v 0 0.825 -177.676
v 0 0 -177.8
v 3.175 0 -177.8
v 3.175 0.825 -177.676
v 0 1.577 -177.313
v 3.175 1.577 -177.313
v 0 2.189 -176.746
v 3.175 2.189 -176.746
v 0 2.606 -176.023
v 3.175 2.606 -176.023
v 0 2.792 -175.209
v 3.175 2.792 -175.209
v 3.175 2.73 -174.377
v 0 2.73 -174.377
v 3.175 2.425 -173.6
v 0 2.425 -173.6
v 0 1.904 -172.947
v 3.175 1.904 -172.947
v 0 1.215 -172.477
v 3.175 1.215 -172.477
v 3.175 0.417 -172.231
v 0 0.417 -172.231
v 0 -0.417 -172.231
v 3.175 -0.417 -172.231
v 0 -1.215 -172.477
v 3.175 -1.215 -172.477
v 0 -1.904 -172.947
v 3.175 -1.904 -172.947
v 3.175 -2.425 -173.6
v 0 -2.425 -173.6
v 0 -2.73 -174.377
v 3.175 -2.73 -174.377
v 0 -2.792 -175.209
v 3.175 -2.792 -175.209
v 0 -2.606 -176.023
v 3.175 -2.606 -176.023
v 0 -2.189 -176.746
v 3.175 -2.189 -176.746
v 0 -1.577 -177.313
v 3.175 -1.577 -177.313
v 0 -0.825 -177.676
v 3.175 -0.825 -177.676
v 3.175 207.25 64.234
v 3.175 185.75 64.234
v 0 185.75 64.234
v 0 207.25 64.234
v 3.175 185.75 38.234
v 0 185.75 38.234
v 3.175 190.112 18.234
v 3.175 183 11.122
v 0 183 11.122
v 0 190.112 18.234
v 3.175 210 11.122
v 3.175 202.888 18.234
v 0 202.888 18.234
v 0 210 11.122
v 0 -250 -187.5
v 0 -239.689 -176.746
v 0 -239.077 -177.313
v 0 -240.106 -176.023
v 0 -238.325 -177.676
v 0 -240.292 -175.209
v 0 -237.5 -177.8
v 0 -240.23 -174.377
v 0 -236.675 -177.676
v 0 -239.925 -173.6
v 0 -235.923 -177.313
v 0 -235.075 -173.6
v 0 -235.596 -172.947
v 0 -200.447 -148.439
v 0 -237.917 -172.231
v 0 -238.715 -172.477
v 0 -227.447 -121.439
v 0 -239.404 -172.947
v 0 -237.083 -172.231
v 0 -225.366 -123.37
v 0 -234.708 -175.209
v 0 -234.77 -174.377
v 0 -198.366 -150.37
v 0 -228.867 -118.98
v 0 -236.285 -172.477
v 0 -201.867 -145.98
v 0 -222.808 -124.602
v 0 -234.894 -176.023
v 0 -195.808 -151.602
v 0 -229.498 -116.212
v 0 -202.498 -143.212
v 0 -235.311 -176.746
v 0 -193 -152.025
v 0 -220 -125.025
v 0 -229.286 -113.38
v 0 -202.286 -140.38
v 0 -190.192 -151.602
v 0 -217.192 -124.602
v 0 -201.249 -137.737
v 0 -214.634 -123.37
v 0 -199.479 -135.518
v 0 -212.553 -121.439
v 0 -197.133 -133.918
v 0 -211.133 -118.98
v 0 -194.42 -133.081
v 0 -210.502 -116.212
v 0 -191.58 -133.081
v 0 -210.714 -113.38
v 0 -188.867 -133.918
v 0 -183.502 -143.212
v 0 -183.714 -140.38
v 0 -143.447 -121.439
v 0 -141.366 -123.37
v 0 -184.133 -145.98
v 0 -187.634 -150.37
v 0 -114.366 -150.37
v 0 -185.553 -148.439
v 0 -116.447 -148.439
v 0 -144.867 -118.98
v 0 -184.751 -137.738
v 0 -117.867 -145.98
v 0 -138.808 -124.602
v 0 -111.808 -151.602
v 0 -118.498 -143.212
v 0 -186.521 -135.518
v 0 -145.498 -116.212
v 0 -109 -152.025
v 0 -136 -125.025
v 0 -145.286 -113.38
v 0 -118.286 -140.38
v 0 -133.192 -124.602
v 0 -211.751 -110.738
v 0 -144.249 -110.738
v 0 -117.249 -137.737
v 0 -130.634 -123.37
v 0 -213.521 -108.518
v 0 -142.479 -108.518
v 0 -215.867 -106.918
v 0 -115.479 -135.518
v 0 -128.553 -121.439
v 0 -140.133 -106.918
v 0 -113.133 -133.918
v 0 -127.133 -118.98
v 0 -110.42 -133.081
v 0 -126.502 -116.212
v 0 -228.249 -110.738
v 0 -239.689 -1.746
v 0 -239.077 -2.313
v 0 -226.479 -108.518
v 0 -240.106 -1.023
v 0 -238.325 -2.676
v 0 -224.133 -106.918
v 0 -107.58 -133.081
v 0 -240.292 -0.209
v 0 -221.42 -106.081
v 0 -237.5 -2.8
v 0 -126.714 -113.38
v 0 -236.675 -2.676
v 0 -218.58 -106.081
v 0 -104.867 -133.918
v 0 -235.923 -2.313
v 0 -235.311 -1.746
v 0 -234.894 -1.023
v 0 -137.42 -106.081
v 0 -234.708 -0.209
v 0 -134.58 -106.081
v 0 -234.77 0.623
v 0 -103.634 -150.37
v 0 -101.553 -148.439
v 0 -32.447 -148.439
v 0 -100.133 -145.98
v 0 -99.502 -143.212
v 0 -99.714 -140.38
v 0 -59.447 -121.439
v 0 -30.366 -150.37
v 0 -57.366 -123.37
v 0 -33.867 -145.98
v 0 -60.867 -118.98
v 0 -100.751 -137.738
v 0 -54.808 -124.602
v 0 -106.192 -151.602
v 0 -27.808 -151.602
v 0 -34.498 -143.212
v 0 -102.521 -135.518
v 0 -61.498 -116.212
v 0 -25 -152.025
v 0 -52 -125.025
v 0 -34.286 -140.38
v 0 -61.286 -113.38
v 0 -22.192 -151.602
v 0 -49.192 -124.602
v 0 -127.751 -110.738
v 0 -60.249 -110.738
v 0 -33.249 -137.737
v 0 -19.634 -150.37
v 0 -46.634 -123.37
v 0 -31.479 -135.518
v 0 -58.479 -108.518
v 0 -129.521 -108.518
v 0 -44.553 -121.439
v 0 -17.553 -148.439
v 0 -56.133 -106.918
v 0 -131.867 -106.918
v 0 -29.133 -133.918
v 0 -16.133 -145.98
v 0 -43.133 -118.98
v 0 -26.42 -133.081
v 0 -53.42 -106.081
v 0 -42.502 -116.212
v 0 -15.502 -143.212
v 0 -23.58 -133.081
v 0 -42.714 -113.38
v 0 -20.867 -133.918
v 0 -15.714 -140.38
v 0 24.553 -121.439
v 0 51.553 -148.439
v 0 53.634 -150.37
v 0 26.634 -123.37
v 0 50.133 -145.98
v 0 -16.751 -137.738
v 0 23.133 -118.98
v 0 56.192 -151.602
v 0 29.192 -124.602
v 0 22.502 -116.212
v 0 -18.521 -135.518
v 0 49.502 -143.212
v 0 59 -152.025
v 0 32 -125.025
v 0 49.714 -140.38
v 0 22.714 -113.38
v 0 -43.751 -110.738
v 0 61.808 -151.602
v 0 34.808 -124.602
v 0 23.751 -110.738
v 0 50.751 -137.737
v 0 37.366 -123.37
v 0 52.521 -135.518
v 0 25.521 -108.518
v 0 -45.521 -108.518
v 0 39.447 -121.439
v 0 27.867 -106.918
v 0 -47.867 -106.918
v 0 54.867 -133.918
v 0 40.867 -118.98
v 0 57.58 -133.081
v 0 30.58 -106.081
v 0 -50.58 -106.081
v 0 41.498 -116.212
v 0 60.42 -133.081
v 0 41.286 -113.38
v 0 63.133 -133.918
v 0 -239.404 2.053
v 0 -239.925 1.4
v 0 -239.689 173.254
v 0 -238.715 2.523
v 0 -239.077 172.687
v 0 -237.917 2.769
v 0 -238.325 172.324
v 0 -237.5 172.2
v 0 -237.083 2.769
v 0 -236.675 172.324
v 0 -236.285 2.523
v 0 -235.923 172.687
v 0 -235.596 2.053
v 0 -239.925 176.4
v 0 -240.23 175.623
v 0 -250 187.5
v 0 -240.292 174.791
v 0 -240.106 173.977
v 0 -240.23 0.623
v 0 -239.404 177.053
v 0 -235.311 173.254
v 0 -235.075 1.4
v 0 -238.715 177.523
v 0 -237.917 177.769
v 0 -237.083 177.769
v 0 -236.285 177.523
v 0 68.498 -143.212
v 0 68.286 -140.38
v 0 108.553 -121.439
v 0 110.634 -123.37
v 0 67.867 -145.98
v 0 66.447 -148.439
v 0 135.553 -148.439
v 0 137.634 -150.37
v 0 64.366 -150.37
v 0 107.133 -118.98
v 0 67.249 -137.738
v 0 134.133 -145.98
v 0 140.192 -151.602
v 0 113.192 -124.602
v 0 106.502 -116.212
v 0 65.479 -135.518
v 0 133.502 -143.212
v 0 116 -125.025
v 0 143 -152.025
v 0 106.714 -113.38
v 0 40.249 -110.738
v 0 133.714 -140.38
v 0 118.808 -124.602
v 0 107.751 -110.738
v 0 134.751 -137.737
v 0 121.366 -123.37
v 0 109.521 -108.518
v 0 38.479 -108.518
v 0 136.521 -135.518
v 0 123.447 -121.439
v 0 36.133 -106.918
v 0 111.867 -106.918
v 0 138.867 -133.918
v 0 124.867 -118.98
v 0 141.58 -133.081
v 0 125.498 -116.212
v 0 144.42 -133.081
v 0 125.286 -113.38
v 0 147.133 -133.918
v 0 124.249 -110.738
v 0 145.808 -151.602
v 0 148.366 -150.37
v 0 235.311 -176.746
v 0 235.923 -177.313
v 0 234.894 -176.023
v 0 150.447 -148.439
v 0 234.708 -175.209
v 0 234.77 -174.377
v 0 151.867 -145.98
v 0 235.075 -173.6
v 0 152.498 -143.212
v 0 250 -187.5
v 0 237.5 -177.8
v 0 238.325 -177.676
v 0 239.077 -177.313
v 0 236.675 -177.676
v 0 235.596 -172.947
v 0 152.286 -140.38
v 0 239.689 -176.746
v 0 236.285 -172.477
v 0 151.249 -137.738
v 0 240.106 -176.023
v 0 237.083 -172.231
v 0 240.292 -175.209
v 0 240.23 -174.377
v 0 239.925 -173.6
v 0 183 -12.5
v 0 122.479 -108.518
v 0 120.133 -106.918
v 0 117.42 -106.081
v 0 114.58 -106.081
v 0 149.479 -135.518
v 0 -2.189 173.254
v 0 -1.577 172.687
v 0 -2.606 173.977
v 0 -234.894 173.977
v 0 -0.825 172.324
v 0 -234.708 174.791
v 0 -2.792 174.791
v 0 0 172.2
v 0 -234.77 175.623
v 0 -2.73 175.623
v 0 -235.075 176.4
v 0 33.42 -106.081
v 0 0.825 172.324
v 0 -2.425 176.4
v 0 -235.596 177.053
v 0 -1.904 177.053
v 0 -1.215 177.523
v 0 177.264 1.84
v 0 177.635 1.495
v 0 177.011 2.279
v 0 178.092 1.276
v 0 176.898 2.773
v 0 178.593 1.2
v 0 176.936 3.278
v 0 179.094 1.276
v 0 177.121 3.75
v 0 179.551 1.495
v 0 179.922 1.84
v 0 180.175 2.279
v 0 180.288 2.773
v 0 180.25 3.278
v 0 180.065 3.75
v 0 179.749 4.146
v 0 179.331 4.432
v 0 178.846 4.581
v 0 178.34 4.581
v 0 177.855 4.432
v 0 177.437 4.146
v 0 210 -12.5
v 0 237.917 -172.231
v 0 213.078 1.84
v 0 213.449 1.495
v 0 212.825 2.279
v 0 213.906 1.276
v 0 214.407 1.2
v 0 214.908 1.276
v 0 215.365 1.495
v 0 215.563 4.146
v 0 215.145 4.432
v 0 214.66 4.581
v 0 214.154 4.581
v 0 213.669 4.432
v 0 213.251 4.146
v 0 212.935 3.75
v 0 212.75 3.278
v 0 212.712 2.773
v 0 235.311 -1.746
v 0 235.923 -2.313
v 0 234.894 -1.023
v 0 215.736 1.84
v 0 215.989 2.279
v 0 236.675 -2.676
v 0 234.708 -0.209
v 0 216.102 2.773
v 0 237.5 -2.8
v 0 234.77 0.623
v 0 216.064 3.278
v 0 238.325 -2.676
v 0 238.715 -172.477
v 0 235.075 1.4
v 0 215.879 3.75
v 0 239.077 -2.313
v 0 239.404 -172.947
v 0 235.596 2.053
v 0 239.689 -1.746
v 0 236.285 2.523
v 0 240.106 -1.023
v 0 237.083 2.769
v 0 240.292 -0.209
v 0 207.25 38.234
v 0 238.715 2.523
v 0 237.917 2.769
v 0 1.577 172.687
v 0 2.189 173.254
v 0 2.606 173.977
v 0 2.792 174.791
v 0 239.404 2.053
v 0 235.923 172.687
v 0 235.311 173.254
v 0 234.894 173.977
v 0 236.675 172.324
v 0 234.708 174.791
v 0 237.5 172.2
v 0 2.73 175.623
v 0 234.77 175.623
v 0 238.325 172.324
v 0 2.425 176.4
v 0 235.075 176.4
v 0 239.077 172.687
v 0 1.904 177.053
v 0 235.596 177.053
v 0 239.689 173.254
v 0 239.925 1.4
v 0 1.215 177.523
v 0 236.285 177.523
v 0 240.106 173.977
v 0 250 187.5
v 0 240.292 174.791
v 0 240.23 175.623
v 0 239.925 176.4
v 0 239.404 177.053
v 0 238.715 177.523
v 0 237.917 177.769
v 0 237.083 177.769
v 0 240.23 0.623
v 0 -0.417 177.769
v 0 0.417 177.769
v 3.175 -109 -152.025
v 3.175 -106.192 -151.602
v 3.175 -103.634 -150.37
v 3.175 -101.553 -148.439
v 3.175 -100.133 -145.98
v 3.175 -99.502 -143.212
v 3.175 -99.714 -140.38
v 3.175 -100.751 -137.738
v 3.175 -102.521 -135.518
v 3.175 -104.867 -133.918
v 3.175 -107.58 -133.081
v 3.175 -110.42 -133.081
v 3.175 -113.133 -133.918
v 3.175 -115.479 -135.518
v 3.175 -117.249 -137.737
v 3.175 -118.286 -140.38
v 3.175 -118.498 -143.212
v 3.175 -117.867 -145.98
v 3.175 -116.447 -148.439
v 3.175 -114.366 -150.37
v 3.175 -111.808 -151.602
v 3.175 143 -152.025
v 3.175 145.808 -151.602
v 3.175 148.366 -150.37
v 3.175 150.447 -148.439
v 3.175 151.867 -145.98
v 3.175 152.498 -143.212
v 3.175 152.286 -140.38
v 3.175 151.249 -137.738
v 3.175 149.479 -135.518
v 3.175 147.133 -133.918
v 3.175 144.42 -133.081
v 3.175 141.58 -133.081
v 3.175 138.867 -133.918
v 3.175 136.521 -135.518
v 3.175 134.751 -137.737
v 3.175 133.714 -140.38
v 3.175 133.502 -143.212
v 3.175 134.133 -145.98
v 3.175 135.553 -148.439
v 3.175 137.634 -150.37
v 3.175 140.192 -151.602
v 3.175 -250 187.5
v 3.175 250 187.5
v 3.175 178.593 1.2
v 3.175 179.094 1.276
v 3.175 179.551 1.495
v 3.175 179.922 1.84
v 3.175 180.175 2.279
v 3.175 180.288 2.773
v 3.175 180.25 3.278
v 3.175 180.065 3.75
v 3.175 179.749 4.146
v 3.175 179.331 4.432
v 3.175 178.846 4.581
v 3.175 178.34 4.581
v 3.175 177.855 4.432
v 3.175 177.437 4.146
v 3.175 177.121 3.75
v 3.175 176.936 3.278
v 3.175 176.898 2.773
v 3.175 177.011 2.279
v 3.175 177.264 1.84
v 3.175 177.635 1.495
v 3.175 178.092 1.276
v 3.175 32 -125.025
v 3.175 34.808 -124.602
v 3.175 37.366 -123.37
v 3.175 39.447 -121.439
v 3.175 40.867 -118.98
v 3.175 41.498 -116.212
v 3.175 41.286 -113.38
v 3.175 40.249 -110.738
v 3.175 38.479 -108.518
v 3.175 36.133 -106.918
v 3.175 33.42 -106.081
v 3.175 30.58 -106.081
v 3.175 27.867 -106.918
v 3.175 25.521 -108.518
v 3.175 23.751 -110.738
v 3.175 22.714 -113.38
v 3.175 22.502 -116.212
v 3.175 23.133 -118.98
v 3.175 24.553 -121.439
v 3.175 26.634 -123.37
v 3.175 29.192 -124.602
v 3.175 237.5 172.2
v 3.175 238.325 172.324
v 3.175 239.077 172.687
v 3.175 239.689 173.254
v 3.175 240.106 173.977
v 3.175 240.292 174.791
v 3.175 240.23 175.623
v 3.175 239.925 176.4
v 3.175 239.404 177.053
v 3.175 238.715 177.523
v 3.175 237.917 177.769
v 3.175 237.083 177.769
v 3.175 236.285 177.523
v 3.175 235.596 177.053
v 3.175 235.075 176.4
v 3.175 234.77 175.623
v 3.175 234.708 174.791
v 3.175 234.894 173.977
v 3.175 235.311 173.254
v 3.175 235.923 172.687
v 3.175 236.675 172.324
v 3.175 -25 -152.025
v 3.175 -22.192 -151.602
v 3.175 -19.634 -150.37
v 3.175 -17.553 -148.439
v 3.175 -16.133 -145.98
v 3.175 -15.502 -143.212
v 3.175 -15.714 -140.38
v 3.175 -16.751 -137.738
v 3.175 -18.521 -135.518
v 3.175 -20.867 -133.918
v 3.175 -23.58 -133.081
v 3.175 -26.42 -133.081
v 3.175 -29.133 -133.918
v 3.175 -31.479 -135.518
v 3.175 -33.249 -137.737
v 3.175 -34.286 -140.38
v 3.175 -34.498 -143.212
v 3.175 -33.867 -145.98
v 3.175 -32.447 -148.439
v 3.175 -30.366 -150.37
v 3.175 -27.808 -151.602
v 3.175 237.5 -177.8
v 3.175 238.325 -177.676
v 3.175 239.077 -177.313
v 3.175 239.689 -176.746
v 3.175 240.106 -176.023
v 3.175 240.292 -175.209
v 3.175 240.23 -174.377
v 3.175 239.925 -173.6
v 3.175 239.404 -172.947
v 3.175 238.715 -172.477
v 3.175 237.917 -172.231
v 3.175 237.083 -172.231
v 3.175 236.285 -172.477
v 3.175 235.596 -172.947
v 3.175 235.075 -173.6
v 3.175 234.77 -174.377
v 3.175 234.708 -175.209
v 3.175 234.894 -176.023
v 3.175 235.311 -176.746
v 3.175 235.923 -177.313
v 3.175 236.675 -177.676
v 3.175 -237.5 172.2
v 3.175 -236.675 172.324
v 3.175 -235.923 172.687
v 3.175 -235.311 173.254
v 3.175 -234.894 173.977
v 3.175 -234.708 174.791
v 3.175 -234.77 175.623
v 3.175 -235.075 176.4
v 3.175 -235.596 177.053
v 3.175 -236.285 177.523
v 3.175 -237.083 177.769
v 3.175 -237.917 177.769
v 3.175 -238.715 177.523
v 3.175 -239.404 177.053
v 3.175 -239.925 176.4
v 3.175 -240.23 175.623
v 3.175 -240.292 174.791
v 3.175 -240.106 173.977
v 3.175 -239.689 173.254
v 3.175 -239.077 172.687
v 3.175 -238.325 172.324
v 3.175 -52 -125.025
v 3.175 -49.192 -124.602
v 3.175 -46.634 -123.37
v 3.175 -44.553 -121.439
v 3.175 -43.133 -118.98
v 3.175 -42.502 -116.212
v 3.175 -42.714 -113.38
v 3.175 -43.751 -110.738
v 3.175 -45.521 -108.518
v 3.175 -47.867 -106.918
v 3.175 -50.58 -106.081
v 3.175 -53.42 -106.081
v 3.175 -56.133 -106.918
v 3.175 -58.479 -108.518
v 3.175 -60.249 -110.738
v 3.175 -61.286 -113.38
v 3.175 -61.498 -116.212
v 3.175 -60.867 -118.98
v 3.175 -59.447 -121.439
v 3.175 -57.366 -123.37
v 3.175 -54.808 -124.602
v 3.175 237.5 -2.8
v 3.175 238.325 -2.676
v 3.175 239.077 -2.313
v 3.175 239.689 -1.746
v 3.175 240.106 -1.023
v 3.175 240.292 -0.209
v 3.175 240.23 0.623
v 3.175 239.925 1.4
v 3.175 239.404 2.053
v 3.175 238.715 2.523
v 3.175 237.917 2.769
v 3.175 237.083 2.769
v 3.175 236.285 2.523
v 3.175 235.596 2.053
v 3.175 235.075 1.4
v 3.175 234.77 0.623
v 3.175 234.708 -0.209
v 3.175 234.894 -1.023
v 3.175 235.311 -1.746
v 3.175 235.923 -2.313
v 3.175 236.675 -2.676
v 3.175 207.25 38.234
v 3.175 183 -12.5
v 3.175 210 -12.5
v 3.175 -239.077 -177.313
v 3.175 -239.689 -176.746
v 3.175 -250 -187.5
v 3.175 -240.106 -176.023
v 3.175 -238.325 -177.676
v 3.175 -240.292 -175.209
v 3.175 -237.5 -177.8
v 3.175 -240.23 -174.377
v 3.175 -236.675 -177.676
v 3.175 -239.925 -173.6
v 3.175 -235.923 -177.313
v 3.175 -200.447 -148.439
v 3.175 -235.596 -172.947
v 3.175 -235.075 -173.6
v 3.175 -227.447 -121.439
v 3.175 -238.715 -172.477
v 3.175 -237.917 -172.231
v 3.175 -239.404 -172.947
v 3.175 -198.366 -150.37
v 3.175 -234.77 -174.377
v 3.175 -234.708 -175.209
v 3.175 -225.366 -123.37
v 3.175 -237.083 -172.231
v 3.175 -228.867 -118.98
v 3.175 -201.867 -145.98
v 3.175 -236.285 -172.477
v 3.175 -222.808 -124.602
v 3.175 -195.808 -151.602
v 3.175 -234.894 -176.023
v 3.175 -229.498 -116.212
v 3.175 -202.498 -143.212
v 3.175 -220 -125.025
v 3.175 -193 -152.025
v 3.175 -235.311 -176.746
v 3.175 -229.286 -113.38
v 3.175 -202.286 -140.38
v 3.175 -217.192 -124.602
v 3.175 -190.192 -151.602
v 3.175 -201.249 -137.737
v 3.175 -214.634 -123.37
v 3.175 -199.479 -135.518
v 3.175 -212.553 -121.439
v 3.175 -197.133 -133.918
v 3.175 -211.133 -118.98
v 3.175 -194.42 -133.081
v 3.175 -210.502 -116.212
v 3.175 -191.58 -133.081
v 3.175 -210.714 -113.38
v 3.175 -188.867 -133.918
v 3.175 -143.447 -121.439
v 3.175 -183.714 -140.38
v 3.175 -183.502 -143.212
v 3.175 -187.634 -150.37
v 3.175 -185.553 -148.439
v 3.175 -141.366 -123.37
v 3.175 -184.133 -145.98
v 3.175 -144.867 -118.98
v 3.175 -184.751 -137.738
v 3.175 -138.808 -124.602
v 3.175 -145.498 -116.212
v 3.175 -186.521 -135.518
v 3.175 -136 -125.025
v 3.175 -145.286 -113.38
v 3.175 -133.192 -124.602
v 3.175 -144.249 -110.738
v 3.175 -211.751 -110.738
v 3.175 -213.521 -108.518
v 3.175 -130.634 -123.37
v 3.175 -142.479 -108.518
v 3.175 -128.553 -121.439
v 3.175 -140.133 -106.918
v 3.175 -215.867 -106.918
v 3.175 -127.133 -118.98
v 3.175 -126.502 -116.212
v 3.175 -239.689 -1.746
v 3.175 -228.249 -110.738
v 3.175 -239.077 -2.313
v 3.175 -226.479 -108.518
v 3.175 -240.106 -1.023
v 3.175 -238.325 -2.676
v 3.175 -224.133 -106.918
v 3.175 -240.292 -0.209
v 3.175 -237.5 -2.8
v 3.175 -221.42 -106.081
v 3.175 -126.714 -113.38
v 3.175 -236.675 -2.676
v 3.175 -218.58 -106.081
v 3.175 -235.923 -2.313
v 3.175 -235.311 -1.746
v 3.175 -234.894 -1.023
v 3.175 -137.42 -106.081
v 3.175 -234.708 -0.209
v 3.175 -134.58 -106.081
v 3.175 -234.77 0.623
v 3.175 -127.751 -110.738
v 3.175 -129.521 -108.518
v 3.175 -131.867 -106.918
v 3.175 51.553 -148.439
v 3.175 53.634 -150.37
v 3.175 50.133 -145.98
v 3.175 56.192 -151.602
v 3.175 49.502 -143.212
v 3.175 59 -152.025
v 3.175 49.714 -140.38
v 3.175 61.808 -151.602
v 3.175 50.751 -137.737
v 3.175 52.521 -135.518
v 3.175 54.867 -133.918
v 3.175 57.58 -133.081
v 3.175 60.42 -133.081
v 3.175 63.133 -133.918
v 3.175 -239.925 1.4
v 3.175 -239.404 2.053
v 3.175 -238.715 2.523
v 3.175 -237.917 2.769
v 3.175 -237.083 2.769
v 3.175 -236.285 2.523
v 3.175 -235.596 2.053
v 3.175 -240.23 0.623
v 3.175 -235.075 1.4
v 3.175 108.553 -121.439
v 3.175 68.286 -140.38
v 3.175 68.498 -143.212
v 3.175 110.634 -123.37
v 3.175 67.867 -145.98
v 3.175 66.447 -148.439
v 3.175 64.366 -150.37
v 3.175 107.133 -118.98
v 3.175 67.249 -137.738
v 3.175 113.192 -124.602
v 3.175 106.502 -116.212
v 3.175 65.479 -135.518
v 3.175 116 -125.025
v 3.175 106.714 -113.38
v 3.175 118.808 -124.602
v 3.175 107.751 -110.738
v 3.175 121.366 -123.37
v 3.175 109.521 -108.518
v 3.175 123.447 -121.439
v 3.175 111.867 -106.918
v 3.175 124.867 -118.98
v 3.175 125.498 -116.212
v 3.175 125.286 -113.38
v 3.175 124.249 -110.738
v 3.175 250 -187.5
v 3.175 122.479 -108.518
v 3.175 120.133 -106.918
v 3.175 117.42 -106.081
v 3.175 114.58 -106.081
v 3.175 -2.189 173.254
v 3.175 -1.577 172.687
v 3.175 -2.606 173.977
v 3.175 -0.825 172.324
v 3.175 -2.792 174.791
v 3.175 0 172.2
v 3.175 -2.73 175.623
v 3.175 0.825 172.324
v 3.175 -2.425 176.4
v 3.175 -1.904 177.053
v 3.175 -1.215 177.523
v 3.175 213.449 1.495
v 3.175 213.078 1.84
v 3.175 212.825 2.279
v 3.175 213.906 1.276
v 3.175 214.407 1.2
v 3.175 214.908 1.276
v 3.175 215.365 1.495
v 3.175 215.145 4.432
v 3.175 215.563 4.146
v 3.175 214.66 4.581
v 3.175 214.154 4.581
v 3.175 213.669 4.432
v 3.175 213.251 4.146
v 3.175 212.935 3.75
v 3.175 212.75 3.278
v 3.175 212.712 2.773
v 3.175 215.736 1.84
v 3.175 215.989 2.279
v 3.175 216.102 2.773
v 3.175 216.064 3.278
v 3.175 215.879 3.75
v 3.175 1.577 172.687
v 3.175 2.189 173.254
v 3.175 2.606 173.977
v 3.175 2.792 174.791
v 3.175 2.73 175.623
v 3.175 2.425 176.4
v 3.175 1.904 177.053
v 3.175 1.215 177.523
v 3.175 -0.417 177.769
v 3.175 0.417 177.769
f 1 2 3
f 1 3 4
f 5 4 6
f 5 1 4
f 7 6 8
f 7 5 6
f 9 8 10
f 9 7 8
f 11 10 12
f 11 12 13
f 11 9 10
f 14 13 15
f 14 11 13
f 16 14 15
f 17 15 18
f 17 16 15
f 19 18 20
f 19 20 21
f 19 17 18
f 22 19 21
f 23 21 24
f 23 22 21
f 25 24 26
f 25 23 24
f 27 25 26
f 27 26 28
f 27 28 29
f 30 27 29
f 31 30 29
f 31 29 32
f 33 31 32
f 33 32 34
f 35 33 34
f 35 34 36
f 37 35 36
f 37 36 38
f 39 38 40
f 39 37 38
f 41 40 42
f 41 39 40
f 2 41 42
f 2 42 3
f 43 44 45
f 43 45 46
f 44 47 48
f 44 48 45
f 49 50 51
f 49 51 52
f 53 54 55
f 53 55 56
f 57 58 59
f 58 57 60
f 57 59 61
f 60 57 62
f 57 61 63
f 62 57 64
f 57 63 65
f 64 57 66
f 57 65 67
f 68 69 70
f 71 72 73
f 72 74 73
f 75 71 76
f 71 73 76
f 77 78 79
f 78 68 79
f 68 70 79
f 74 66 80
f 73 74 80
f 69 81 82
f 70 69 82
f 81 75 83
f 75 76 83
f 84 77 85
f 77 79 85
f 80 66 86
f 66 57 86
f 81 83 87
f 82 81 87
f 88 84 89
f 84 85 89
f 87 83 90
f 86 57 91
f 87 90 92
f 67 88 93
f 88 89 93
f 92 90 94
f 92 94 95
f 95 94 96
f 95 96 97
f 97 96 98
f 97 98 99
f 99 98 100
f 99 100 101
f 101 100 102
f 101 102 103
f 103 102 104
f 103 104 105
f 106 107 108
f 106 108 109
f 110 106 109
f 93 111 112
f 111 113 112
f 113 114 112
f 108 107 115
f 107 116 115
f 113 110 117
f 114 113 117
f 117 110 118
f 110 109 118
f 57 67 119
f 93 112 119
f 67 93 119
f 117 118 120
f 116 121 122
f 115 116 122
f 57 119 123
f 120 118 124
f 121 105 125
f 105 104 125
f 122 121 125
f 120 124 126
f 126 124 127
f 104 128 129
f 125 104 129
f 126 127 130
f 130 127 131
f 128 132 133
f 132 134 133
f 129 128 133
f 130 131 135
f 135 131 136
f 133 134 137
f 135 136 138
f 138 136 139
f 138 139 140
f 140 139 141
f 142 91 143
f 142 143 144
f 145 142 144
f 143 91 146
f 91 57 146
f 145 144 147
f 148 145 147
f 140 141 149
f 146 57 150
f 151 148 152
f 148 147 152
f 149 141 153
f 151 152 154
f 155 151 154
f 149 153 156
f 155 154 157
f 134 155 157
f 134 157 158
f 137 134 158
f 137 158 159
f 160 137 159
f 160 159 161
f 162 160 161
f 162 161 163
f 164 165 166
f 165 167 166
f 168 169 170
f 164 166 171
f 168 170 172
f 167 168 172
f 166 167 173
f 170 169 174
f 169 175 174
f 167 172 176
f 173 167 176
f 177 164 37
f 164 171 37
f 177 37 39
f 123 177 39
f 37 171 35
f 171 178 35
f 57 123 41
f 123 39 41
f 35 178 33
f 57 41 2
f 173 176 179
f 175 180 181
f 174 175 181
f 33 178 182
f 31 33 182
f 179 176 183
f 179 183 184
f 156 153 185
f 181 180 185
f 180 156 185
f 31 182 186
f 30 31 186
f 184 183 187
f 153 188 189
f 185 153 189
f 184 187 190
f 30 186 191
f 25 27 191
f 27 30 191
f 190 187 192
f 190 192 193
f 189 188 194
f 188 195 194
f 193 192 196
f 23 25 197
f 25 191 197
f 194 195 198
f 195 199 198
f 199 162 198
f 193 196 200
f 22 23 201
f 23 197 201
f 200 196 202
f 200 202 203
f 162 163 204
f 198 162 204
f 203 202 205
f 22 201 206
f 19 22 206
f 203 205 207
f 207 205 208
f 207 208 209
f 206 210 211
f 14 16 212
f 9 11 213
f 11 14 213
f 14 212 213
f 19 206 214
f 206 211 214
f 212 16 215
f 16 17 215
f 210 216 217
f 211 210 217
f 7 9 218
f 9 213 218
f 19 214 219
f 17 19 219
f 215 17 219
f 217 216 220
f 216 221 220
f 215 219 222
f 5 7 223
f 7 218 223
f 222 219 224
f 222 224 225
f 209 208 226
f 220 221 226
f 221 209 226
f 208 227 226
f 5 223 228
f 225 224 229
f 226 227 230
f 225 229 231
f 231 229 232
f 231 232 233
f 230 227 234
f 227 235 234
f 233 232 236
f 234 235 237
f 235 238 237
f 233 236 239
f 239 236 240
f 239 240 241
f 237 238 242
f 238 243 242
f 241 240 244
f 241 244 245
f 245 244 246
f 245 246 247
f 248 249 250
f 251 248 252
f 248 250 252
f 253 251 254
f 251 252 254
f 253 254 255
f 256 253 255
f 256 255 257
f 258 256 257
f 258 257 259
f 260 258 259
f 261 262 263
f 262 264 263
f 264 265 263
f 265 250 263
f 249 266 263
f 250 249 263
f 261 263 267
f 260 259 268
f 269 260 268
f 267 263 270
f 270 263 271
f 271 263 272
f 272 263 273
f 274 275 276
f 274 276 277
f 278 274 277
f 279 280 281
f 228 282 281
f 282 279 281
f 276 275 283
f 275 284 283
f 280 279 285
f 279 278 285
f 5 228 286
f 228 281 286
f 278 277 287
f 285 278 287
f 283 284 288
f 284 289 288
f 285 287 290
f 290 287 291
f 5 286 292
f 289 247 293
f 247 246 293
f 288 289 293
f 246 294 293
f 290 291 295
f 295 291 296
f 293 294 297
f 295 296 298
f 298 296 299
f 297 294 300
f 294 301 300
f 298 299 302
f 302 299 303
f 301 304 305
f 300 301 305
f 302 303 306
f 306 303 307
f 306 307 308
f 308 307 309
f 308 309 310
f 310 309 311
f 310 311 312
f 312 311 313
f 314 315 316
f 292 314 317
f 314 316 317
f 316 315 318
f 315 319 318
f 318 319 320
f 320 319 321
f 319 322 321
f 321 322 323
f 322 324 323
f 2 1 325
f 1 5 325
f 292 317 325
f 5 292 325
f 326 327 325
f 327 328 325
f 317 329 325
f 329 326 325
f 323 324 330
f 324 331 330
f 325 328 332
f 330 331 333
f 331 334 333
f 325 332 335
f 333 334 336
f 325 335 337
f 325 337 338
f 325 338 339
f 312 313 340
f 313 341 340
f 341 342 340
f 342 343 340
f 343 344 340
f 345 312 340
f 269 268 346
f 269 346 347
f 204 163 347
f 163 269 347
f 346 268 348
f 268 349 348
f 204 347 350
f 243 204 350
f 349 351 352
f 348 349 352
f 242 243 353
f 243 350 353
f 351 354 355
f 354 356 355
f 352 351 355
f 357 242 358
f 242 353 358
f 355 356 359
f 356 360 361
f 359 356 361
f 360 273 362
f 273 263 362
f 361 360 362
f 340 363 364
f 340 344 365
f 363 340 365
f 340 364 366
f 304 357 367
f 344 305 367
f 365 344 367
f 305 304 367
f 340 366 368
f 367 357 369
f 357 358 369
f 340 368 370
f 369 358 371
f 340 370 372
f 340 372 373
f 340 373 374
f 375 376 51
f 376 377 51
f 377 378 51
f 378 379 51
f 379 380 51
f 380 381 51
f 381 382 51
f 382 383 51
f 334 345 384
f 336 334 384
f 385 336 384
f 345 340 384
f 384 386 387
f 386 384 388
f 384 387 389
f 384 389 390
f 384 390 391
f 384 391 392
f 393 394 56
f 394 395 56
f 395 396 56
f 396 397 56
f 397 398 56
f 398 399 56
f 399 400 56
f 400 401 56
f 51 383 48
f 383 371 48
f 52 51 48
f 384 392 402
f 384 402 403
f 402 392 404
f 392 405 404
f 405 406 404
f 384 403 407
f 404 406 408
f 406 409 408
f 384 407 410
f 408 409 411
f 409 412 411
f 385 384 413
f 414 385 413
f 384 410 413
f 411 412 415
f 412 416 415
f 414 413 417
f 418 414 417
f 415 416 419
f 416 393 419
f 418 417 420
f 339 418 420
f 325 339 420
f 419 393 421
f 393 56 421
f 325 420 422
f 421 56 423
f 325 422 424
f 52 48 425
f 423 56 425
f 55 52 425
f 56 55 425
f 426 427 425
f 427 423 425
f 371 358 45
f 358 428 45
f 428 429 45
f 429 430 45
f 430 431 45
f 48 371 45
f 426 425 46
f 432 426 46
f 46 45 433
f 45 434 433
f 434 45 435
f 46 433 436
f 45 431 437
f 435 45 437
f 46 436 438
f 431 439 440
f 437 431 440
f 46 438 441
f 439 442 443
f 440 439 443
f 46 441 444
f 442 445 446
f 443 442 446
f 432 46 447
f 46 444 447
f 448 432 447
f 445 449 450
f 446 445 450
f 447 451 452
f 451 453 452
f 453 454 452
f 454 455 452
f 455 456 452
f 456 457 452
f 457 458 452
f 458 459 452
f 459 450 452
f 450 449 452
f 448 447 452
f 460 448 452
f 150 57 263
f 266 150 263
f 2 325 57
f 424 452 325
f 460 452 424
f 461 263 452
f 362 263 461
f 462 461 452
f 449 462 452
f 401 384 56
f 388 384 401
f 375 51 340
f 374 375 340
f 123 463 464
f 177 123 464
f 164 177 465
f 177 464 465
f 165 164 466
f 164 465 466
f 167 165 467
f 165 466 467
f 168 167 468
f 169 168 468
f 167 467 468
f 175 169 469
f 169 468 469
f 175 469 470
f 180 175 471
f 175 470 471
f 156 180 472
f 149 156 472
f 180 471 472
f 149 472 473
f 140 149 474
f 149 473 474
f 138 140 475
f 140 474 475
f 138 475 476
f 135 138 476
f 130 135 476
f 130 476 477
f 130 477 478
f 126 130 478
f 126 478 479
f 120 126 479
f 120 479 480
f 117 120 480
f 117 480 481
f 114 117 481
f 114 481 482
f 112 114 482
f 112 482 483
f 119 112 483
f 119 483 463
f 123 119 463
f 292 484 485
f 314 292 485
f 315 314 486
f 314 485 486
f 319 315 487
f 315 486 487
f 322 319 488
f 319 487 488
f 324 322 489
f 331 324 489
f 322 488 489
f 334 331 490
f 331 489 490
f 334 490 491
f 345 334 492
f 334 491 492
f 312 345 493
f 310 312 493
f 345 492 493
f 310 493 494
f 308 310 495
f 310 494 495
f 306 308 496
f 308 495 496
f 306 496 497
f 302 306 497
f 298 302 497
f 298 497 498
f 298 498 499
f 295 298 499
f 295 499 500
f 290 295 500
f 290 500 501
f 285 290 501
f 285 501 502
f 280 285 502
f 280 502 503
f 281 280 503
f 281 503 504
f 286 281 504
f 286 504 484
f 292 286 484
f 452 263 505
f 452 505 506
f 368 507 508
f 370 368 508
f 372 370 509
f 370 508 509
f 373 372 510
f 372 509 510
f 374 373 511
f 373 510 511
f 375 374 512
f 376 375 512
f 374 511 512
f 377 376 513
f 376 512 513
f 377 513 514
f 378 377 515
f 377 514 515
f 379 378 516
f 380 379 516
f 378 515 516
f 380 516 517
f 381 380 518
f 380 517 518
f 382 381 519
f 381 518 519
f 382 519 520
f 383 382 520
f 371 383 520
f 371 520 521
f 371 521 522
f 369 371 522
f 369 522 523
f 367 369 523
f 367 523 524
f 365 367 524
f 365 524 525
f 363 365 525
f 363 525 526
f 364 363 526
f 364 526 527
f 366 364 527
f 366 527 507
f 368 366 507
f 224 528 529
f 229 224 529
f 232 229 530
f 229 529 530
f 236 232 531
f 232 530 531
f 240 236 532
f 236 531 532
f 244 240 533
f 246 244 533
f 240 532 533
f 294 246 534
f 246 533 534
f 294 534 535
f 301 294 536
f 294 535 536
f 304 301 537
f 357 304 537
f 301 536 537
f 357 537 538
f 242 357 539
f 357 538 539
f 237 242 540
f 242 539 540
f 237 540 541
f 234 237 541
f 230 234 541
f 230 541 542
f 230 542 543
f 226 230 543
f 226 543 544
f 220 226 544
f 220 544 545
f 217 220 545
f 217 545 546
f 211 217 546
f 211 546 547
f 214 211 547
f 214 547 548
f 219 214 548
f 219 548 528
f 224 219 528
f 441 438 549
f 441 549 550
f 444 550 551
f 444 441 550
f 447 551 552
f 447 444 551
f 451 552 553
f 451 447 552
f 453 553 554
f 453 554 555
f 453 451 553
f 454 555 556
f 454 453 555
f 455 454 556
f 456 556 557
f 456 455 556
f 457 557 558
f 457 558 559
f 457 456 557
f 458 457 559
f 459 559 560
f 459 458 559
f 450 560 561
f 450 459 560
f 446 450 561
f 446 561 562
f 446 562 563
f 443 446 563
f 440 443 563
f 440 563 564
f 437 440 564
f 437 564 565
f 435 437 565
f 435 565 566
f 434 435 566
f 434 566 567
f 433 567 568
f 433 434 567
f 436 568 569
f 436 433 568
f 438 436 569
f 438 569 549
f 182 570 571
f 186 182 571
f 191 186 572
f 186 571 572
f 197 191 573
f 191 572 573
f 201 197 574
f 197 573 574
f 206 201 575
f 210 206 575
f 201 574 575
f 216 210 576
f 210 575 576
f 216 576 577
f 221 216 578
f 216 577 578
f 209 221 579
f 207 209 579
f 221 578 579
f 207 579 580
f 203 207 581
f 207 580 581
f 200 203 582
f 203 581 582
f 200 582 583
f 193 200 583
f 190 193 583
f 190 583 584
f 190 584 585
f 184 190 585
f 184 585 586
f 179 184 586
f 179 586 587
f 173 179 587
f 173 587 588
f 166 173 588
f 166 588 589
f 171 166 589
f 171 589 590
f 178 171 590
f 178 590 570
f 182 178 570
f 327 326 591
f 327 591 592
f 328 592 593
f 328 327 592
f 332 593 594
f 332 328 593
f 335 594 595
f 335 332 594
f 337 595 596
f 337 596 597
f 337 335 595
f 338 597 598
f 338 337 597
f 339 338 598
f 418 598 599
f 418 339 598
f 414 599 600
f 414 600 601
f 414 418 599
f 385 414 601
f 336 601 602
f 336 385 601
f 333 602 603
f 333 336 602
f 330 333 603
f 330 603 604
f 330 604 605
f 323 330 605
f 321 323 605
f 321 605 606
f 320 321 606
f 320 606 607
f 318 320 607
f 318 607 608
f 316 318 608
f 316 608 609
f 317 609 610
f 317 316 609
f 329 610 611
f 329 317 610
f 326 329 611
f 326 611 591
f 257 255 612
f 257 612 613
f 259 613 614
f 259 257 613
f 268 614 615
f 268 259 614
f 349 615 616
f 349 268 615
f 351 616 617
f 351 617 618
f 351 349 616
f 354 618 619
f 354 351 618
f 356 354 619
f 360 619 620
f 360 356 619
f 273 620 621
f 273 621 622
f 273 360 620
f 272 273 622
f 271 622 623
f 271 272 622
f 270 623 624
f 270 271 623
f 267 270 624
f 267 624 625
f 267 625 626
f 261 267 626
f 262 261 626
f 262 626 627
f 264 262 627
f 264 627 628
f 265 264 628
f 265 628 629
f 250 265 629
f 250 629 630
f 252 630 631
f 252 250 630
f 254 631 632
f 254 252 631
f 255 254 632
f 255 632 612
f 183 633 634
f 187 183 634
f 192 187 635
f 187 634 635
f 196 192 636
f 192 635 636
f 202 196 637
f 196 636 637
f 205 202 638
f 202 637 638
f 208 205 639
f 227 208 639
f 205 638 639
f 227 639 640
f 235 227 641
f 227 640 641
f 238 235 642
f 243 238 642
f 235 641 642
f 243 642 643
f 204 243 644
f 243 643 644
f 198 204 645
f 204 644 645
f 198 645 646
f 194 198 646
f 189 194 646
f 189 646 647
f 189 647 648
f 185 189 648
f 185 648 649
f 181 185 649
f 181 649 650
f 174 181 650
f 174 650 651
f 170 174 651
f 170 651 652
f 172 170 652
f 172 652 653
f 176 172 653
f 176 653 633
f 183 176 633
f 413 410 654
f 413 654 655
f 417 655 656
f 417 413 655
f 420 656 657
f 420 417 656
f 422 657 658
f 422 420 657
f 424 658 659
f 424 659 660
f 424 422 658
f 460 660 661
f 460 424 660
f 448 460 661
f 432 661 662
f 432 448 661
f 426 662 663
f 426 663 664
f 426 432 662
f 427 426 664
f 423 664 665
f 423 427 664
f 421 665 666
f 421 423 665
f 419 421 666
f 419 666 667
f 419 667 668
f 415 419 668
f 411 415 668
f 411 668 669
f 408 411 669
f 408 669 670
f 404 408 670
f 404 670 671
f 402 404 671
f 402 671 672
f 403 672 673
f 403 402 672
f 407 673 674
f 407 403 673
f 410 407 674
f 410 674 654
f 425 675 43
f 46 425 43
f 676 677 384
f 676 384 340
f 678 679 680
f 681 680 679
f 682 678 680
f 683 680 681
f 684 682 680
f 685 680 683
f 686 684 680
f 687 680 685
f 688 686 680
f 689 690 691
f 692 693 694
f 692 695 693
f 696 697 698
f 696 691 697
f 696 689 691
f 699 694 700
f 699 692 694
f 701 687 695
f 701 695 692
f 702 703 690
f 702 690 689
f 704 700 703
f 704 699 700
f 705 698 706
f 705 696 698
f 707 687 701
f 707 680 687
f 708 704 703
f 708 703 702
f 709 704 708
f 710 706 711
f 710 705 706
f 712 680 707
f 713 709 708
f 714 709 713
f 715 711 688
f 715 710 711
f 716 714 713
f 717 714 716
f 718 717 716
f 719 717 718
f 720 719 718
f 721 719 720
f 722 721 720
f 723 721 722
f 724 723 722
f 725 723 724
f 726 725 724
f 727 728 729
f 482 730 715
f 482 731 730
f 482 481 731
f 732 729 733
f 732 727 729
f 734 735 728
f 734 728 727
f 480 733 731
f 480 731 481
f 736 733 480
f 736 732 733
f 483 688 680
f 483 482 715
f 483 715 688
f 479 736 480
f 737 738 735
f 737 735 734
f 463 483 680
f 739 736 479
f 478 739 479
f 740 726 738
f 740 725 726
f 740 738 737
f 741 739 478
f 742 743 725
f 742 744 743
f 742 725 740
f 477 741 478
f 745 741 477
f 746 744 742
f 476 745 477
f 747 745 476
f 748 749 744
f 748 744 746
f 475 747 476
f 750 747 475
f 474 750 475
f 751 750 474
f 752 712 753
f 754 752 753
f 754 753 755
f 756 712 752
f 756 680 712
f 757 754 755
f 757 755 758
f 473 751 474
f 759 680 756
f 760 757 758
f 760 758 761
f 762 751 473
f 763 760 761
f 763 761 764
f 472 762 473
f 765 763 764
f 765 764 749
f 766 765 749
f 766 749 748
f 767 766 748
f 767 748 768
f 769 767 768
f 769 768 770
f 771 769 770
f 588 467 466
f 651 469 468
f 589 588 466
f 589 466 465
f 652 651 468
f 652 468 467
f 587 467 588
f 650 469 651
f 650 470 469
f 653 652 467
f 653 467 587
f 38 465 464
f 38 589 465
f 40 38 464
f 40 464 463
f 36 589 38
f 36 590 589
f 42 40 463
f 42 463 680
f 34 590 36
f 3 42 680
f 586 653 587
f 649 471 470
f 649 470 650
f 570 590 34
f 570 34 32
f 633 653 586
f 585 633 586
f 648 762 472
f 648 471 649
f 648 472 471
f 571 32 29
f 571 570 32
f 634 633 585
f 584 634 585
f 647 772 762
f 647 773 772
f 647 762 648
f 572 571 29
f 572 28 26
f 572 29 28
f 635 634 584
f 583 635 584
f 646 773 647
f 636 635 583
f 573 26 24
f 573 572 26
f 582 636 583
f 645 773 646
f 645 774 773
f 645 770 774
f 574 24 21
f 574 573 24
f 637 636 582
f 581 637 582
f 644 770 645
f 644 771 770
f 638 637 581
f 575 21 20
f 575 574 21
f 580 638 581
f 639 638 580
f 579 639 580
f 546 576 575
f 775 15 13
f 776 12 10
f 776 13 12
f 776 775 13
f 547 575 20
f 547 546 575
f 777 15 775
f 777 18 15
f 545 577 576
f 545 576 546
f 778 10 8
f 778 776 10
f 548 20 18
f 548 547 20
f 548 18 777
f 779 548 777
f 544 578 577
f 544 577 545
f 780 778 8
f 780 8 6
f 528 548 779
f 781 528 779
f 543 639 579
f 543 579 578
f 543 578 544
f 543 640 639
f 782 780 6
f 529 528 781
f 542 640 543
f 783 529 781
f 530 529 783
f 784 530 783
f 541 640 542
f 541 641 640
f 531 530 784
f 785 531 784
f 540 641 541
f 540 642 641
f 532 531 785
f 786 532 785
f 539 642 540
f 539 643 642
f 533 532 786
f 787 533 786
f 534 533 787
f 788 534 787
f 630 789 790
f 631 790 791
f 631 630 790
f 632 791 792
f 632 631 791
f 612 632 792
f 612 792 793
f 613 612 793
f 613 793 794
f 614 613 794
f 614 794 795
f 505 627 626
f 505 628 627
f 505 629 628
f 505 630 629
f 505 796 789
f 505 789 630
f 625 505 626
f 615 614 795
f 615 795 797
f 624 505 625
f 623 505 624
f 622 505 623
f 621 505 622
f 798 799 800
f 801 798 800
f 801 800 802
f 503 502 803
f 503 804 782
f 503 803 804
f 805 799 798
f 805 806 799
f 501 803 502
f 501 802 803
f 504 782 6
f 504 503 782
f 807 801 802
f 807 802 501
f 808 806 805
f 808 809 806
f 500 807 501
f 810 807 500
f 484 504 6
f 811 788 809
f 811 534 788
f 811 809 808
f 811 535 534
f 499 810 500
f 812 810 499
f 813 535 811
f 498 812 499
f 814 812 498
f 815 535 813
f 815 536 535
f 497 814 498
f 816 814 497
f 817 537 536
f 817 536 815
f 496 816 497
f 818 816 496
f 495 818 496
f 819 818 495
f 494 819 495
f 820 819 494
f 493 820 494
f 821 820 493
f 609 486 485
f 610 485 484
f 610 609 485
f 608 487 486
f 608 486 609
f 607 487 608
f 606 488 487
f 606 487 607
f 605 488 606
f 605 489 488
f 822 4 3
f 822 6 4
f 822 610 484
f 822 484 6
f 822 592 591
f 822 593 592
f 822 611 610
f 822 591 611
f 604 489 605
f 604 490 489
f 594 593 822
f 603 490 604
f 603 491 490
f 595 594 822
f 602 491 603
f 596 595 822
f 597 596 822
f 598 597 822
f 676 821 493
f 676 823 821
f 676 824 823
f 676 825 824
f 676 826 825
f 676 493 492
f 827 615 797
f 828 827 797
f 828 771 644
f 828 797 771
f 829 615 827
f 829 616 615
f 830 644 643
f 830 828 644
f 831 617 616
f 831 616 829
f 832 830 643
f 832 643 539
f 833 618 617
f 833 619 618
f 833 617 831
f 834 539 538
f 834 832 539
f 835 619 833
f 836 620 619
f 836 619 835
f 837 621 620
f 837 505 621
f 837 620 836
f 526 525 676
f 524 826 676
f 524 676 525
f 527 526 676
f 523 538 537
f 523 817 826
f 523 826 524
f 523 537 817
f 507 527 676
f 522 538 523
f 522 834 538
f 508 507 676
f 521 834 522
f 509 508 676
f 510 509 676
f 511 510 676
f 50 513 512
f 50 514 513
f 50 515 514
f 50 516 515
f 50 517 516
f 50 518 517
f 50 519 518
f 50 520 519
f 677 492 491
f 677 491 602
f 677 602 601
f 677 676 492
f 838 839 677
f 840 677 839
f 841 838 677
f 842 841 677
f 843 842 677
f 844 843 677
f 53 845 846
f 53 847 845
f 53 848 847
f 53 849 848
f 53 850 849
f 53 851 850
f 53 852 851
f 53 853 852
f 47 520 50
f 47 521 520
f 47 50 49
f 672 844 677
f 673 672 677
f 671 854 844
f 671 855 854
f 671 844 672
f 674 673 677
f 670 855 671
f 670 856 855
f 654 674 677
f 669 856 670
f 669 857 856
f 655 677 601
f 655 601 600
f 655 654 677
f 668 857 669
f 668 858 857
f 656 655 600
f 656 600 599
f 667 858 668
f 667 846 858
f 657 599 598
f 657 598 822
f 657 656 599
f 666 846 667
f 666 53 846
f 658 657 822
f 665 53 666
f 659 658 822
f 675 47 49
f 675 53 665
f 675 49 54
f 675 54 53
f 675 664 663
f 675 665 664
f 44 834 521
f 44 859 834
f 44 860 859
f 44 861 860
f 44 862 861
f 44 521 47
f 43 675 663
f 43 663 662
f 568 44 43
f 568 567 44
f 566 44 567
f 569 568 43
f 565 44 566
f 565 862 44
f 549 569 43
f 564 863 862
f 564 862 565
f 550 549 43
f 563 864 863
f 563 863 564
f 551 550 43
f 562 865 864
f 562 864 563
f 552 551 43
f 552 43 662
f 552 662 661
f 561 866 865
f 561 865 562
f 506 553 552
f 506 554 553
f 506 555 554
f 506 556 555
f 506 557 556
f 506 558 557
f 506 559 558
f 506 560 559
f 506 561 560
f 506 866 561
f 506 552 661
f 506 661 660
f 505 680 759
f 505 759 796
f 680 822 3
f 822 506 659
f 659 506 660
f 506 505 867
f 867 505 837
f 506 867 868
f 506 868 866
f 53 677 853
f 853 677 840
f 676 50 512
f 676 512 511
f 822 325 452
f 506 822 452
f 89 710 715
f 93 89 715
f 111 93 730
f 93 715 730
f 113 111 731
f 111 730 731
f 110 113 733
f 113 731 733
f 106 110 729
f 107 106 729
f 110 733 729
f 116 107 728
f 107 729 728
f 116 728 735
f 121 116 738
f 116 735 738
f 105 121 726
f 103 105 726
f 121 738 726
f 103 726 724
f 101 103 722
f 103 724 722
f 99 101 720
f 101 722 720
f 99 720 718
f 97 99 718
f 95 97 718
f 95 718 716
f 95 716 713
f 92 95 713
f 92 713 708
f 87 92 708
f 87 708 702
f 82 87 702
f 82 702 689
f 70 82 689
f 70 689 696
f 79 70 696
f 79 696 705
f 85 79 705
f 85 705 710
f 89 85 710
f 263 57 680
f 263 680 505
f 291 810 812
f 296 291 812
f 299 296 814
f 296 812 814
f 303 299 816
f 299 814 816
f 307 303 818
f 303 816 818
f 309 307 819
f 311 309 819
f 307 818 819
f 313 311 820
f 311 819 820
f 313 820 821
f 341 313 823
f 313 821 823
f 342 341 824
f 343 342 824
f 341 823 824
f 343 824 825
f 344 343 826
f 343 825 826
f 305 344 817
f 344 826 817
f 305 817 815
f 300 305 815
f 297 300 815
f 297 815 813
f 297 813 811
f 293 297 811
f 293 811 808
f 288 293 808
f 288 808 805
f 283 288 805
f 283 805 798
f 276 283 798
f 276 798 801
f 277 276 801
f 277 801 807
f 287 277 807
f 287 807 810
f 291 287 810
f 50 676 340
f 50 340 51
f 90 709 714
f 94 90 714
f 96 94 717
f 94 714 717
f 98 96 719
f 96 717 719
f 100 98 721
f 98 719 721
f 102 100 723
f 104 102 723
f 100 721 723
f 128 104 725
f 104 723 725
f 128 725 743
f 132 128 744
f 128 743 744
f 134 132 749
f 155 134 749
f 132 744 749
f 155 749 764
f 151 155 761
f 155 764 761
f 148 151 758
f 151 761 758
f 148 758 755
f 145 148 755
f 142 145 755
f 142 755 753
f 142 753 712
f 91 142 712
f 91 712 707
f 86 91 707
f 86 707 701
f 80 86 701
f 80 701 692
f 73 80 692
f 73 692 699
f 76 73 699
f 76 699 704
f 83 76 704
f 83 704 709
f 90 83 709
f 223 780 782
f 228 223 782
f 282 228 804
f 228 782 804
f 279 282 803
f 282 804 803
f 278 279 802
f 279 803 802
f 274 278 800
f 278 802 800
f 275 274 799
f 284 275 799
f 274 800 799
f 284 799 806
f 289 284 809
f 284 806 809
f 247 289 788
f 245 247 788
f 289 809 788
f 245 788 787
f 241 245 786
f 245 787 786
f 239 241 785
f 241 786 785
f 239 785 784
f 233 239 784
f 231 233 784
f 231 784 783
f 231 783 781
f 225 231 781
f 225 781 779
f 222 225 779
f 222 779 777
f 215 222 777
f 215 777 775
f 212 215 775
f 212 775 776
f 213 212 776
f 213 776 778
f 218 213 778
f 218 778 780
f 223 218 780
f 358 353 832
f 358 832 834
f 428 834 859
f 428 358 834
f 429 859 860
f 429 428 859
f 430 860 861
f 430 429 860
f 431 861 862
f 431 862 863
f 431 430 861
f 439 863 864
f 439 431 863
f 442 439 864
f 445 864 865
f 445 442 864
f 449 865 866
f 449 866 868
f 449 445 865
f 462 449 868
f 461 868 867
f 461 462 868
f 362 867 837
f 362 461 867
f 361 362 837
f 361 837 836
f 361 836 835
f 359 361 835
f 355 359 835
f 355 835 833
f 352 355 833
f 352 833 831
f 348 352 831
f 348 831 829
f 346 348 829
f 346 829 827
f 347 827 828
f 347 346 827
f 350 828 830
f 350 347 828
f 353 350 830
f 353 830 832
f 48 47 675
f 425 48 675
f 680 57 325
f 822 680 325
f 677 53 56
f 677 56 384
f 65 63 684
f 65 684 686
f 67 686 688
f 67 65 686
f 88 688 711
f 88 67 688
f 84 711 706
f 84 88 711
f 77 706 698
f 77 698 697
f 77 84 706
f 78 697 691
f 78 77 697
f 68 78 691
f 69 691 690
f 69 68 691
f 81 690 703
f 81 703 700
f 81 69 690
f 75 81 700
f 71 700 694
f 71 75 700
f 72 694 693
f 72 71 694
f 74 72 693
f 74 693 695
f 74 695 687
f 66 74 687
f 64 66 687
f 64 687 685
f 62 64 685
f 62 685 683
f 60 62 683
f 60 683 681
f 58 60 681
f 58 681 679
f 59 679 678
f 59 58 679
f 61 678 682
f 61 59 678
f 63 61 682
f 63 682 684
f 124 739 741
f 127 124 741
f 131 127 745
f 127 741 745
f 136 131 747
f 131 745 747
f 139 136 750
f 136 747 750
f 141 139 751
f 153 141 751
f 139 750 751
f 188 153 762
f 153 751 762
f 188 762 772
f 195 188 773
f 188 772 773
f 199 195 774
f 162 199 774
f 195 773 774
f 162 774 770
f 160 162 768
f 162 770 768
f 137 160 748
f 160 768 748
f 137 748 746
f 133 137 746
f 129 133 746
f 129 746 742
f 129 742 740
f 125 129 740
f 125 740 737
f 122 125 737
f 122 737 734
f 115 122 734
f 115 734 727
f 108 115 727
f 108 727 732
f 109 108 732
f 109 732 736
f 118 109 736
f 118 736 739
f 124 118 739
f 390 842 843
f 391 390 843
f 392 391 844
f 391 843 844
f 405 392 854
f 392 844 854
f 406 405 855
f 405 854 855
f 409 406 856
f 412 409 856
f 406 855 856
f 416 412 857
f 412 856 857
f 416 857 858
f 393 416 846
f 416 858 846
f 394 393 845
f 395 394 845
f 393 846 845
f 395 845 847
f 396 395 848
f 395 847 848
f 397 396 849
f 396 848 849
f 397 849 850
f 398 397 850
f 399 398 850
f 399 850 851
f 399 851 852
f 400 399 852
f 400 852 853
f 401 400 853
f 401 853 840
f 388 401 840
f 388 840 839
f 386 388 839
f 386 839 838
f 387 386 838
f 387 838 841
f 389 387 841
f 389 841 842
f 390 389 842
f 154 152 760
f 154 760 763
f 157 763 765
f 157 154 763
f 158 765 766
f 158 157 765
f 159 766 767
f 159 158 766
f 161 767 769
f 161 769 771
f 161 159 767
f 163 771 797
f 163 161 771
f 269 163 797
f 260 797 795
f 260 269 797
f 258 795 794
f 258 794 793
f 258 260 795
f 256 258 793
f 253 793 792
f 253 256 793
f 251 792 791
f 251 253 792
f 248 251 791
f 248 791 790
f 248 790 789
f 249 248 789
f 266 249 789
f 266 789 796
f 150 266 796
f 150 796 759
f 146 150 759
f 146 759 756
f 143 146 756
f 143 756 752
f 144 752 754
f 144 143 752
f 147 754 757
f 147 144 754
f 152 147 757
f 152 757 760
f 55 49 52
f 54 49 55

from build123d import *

# Parameters (mm, degrees)
SKETCH1_W           = 500
SKETCH1_H           = 375
SKETCH1_R           = 2.8
BOSS_EXTRUDE1_DEPTH = 3.175
SKETCH2_R           = 9.525
CUT_EXTRUDE1_DEPTH  = 313.516128584
CUT_EXTRUDE2_DEPTH  = 313.516128584
SKETCH5_R           = 1.7
CUT_EXTRUDE3_DEPTH  = 313.516128584
SKETCH6_W           = 21.5
SKETCH6_H           = 26
CUT_EXTRUDE4_DEPTH  = 313.516128584


with BuildPart() as part:
    # Sketch1 → Boss-Extrude1 (new body)
    with BuildSketch(Plane.YZ):
        Rectangle(SKETCH1_W, SKETCH1_H)
        with Locations(Location((-237.5, 175, 0), (0, 0, 270))):
            Circle(SKETCH1_R, mode=Mode.SUBTRACT)
        with Locations(Location((237.5, 175, 0), (0, 0, 270))):
            Circle(SKETCH1_R, mode=Mode.SUBTRACT)
        with Locations(Location((237.5, -175, 0), (0, 0, 270))):
            Circle(SKETCH1_R, mode=Mode.SUBTRACT)
        with Locations(Location((-237.5, -175, 0), (0, 0, 270))):
            Circle(SKETCH1_R, mode=Mode.SUBTRACT)
        with Locations(Location((-237.5, 0, 0), (0, 0, 270))):
            Circle(SKETCH1_R, mode=Mode.SUBTRACT)
        with Locations(Location((0, 175, 0), (0, 0, 270))):
            Circle(SKETCH1_R, mode=Mode.SUBTRACT)
        with Locations(Location((237.5, 0, 0), (0, 0, 270))):
            Circle(SKETCH1_R, mode=Mode.SUBTRACT)
        with Locations(Location((0, -175, 0), (0, 0, 270))):
            Circle(SKETCH1_R, mode=Mode.SUBTRACT)
    extrude(amount=BOSS_EXTRUDE1_DEPTH)

    # Sketch2 → Cut-Extrude1 (cut, through all)
    with BuildSketch(Plane.YZ.offset(3.175)):
        with Locations(Location((-220, -115.5, 0), (0, 0, 270))):
            Circle(SKETCH2_R)
        with Locations(Location((-193, -142.5, 0), (0, 0, 270))):
            Circle(SKETCH2_R)
        with Locations(Location((-136, -115.5, 0), (0, 0, 270))):
            Circle(SKETCH2_R)
        with Locations(Location((-109, -142.5, 0), (0, 0, 270))):
            Circle(SKETCH2_R)
        with Locations(Location((-52, -115.5, 0), (0, 0, 270))):
            Circle(SKETCH2_R)
        with Locations(Location((-25, -142.5, 0), (0, 0, 270))):
            Circle(SKETCH2_R)
        with Locations(Location((32, -115.5, 0), (0, 0, 270))):
            Circle(SKETCH2_R)
        with Locations(Location((59, -142.5, 0), (0, 0, 270))):
            Circle(SKETCH2_R)
        with Locations(Location((116, -115.5, 0), (0, 0, 270))):
            Circle(SKETCH2_R)
        with Locations(Location((143, -142.5, 0), (0, 0, 270))):
            Circle(SKETCH2_R)
    extrude(amount=-CUT_EXTRUDE1_DEPTH, mode=Mode.SUBTRACT)

    # Sketch4 → Cut-Extrude2 (cut, through all)
    with BuildSketch(Plane.YZ.offset(3.175)):
        Polygon((210, -12.5), (183, -12.5), (183, 11.122), (190.112, 18.234), (202.888, 18.234), (210, 11.122), align=None)
    extrude(amount=-CUT_EXTRUDE2_DEPTH, mode=Mode.SUBTRACT)

    # Sketch5 → Cut-Extrude3 (cut, through all)
    with BuildSketch(Plane.YZ.offset(3.175)):
        with Locations(Location((178.593, 2.9, 0), (0, 0, 270))):
            Circle(SKETCH5_R)
        with Locations(Location((214.407, 2.9, 0), (0, 0, 270))):
            Circle(SKETCH5_R)
    extrude(amount=-CUT_EXTRUDE3_DEPTH, mode=Mode.SUBTRACT)

    # Sketch6 → Cut-Extrude4 (cut, through all)
    with BuildSketch(Plane.YZ.offset(3.175)):
        with Locations((196.5, 51.234)):
            Rectangle(SKETCH6_W, SKETCH6_H)
    extrude(amount=-CUT_EXTRUDE4_DEPTH, mode=Mode.SUBTRACT)


solid = part.part
